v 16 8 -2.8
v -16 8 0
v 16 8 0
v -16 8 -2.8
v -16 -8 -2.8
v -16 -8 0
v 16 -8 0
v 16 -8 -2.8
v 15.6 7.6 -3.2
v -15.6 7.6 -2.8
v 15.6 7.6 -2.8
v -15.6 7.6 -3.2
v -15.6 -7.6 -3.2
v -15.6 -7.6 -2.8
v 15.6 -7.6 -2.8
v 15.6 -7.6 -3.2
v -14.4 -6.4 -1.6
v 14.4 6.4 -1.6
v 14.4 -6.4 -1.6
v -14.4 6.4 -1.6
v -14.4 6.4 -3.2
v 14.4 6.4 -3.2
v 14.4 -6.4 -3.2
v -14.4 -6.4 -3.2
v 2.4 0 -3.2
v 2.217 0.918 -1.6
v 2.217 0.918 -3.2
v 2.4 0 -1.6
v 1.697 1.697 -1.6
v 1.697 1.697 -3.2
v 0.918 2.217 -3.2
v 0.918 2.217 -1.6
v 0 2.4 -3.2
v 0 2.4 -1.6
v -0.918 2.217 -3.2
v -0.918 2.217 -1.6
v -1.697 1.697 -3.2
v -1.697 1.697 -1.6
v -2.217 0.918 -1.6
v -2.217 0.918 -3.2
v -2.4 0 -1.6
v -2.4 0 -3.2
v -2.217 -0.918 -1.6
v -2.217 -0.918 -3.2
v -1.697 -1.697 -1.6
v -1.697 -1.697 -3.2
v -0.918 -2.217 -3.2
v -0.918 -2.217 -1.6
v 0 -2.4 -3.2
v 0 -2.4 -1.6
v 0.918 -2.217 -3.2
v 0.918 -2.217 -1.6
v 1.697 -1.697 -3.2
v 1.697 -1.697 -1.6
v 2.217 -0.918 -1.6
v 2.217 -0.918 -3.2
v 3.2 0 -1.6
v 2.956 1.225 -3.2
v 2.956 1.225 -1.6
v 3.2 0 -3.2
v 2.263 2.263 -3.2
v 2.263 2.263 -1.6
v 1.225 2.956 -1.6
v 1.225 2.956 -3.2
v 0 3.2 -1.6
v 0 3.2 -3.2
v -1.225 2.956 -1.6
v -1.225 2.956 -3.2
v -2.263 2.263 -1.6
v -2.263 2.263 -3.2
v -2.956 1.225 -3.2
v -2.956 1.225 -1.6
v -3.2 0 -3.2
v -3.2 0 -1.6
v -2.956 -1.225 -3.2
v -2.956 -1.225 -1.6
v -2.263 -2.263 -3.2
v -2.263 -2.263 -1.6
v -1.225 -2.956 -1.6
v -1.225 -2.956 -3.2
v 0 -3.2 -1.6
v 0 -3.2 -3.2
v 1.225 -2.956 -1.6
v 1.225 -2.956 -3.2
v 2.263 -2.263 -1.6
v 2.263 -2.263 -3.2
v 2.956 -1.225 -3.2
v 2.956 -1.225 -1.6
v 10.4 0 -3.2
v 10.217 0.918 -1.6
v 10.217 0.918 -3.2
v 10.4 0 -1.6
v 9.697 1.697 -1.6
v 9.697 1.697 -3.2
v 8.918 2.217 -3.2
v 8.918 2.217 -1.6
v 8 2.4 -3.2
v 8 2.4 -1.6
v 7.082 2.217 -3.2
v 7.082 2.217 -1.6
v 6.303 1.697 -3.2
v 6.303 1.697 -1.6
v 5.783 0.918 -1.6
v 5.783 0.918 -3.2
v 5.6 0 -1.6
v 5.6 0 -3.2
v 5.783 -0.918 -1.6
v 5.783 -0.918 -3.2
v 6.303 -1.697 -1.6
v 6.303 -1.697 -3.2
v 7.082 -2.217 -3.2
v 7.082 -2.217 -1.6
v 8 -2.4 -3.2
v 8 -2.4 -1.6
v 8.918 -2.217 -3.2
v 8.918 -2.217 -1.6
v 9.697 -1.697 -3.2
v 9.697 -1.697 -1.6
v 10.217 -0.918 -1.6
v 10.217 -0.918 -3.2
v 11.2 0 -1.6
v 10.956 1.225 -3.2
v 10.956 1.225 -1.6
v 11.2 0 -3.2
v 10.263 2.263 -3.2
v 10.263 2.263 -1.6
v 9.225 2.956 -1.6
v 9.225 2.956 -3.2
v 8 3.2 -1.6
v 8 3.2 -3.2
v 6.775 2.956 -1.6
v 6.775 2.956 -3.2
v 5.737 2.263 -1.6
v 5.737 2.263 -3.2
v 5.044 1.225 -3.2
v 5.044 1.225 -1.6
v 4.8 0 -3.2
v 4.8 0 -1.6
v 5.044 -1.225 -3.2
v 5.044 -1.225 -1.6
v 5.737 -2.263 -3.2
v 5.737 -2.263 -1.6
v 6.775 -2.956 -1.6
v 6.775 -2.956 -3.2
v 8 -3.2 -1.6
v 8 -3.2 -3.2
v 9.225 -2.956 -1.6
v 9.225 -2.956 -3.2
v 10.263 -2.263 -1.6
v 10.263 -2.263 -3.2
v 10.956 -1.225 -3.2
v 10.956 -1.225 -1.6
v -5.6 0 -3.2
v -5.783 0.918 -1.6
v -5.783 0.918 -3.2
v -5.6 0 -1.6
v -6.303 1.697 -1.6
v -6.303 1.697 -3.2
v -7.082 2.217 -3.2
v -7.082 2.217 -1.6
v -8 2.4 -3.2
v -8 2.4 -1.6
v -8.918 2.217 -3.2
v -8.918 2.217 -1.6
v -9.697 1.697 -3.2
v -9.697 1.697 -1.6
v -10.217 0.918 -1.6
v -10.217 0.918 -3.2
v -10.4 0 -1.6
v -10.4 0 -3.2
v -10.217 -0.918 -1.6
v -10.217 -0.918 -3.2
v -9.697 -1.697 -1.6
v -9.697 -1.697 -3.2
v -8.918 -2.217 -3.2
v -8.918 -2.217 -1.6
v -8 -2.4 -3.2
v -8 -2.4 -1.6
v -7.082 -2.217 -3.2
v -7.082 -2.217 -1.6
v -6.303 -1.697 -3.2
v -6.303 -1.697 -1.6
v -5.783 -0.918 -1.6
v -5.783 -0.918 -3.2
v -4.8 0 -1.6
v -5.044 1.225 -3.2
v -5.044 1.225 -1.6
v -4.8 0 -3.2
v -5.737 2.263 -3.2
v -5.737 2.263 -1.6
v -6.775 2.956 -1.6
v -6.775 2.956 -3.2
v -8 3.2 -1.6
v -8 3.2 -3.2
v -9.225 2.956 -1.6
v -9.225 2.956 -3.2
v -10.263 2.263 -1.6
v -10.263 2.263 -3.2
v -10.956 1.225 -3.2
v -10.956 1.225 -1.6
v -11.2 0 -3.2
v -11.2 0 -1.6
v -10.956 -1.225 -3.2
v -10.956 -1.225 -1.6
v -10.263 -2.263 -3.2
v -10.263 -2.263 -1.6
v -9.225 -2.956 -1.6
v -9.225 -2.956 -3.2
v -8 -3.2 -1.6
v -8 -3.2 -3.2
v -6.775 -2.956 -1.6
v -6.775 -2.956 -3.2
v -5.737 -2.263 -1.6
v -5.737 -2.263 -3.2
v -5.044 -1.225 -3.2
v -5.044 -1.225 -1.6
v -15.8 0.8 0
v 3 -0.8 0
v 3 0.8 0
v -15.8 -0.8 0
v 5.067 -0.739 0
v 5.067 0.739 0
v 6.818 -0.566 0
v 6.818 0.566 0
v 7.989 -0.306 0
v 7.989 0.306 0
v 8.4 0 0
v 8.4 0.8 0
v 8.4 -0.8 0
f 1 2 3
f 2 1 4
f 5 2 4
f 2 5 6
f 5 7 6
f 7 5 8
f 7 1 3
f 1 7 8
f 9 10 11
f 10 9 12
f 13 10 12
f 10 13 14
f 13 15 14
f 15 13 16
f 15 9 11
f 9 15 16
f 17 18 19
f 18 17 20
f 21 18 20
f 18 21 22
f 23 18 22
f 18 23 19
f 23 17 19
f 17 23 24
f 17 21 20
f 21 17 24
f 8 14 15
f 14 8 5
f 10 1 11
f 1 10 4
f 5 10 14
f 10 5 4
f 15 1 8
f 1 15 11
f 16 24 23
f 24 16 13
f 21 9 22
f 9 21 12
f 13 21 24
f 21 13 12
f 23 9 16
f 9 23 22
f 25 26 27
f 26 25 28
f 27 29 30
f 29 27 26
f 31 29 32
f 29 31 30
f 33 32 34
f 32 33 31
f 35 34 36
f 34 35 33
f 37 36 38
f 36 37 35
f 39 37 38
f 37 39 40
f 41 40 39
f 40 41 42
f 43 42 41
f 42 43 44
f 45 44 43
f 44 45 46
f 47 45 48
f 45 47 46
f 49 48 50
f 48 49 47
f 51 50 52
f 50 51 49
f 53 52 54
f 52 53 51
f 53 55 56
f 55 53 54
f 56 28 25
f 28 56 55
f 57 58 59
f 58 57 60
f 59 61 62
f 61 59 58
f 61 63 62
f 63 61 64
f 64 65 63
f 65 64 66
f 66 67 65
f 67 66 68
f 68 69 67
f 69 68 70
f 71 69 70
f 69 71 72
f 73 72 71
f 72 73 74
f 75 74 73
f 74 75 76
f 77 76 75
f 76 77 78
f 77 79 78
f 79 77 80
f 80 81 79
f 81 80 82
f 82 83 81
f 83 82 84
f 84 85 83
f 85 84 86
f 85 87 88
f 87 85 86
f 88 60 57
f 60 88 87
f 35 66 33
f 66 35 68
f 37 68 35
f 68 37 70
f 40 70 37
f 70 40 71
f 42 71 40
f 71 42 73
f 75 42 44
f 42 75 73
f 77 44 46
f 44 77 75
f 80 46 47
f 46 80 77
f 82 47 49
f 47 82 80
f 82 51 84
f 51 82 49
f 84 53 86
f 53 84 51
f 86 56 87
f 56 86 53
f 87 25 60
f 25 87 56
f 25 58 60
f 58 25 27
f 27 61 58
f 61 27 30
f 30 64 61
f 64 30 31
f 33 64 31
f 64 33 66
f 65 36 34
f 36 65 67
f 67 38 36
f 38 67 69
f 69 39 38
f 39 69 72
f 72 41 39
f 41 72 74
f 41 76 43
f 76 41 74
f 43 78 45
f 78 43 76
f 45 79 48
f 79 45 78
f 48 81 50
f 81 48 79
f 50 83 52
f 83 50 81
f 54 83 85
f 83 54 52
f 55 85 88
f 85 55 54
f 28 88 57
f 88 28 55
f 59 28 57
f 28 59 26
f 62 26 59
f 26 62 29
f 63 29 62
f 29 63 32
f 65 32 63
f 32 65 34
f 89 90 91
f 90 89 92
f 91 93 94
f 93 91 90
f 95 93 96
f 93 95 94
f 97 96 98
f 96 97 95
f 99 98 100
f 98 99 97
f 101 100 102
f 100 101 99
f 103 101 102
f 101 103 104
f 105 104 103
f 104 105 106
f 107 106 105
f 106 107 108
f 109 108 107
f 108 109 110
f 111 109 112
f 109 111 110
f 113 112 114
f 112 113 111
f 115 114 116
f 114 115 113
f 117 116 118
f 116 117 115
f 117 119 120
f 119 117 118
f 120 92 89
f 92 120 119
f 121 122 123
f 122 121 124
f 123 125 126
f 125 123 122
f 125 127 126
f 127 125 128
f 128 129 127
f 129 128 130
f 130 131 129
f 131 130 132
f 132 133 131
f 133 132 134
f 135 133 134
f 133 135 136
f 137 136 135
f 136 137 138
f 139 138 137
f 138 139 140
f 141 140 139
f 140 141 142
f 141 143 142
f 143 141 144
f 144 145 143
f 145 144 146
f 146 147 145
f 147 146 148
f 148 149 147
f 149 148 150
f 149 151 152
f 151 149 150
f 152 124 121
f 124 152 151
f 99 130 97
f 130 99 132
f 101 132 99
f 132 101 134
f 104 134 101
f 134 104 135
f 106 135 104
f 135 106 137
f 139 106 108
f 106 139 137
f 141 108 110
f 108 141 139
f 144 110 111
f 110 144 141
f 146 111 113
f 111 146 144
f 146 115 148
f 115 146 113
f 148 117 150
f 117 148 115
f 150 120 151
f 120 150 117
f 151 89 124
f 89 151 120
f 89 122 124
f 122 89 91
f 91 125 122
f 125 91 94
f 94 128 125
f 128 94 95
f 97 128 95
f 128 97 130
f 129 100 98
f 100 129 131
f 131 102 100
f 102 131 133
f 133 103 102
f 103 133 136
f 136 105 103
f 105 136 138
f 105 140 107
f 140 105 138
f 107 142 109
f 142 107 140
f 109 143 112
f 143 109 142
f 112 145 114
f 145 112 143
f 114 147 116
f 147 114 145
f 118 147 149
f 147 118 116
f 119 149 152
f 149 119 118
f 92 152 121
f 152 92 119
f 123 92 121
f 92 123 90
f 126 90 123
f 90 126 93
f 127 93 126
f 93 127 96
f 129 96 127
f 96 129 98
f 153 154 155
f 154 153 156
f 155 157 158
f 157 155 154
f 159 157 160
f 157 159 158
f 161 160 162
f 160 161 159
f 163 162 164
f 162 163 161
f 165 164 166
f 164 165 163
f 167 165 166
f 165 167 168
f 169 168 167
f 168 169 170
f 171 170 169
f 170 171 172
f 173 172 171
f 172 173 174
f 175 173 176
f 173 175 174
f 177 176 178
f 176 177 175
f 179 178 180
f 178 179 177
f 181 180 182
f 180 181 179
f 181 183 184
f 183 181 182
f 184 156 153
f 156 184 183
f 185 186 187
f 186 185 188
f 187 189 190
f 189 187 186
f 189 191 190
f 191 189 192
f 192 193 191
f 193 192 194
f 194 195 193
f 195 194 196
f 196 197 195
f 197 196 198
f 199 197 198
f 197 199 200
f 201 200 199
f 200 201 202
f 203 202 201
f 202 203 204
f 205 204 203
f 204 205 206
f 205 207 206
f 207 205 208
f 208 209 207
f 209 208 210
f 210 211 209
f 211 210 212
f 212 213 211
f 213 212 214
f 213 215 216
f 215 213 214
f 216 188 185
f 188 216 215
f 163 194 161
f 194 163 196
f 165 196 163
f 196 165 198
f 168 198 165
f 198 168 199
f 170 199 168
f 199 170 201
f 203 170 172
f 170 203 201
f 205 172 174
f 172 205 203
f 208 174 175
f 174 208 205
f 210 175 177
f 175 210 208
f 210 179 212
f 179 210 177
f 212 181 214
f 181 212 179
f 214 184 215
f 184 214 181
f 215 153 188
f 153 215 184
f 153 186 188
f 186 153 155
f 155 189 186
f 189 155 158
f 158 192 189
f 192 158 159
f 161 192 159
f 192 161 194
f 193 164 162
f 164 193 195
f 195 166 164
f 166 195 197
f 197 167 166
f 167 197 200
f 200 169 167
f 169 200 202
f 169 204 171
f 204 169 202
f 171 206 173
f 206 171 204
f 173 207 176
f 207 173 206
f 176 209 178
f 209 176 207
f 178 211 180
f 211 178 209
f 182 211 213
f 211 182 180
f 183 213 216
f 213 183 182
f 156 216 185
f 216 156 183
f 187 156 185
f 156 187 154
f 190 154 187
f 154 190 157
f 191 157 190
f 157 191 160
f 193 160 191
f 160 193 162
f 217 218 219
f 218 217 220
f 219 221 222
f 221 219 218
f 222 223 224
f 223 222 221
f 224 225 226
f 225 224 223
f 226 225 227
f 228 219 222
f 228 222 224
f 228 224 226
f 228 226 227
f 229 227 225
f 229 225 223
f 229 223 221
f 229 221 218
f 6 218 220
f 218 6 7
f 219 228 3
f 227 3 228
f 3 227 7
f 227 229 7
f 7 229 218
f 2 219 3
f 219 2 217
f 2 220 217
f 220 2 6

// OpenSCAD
// file: ../p/4-4ring3.scad
use <../lib.scad>
$fa=1; $fs=0.2;
function ldraw_lib__4_4ring3(realsolid=false) = [
// 0 Ring  3 x 1.0
// 0 Name: 4-4ring3.dat
// 0 Author: James Jessiman
// 0 !LDRAW_ORG Primitive UPDATE 2009-01
// 0 !LICENSE Licensed under CC BY 2.0 and CC BY 4.0 : see CAreadme.txt
// 
// 0 BFC CERTIFY CCW
  [0,"BFC","CERTIFY"],
  [0,"BFC","CCW"],
// 
// 0 !HISTORY 1998-12-15 [PTadmin] Official Update 1998-10
// 0 !HISTORY 2002-04-05 [hafhead] Added BFC statement
// 0 !HISTORY 2002-04-25 [PTadmin] Official Update 2002-02
// 0 !HISTORY 2007-06-24 [PTadmin] Header formatted for Contributor Agreement
// 0 !HISTORY 2008-07-01 [PTadmin] Official Update 2008-01
// 0 !HISTORY 2008-08-26 [cwdee] Switch polygon winding and rename
// 0 !HISTORY 2009-05-02 [PTadmin] Official Update 2009-01
// 
// 
// 4 16 -1.5308 0 3.6956 -1.1481 0 2.7717 0 0 3 0 0 4
  [4,16,-1.5308,0,3.6956,-1.1481,0,2.7717,0,0,3,0,0,4],
// 4 16 -2.8284 0 2.8284 -2.1213 0 2.1213 -1.1481 0 2.7717 -1.5308 0 3.6956
  [4,16,-2.8284,0,2.8284,-2.1213,0,2.1213,-1.1481,0,2.7717,-1.5308,0,3.6956],
// 4 16 -3.6956 0 1.5308 -2.7717 0 1.1481 -2.1213 0 2.1213 -2.8284 0 2.8284
  [4,16,-3.6956,0,1.5308,-2.7717,0,1.1481,-2.1213,0,2.1213,-2.8284,0,2.8284],
// 4 16 -4 0 0 -3 0 0 -2.7717 0 1.1481 -3.6956 0 1.5308
  [4,16,-4,0,0,-3,0,0,-2.7717,0,1.1481,-3.6956,0,1.5308],
// 4 16 -3.6956 0 -1.5308 -2.7717 0 -1.1481 -3 0 0 -4 0 0
  [4,16,-3.6956,0,-1.5308,-2.7717,0,-1.1481,-3,0,0,-4,0,0],
// 4 16 -2.8284 0 -2.8284 -2.1213 0 -2.1213 -2.7717 0 -1.1481 -3.6956 0 -1.5308
  [4,16,-2.8284,0,-2.8284,-2.1213,0,-2.1213,-2.7717,0,-1.1481,-3.6956,0,-1.5308],
// 4 16 -1.5308 0 -3.6956 -1.1481 0 -2.7717 -2.1213 0 -2.1213 -2.8284 0 -2.8284
  [4,16,-1.5308,0,-3.6956,-1.1481,0,-2.7717,-2.1213,0,-2.1213,-2.8284,0,-2.8284],
// 4 16 0 0 -4 0 0 -3 -1.1481 0 -2.7717 -1.5308 0 -3.6956
  [4,16,0,0,-4,0,0,-3,-1.1481,0,-2.7717,-1.5308,0,-3.6956],
// 4 16 1.5308 0 -3.6956 1.1481 0 -2.7717 0 0 -3 0 0 -4
  [4,16,1.5308,0,-3.6956,1.1481,0,-2.7717,0,0,-3,0,0,-4],
// 4 16 2.8284 0 -2.8284 2.1213 0 -2.1213 1.1481 0 -2.7717 1.5308 0 -3.6956
  [4,16,2.8284,0,-2.8284,2.1213,0,-2.1213,1.1481,0,-2.7717,1.5308,0,-3.6956],
// 4 16 3.6956 0 -1.5308 2.7717 0 -1.1481 2.1213 0 -2.1213 2.8284 0 -2.8284
  [4,16,3.6956,0,-1.5308,2.7717,0,-1.1481,2.1213,0,-2.1213,2.8284,0,-2.8284],
// 4 16 4 0 0 3 0 0 2.7717 0 -1.1481 3.6956 0 -1.5308
  [4,16,4,0,0,3,0,0,2.7717,0,-1.1481,3.6956,0,-1.5308],
// 4 16 3.6956 0 1.5308 2.7717 0 1.1481 3 0 0 4 0 0
  [4,16,3.6956,0,1.5308,2.7717,0,1.1481,3,0,0,4,0,0],
// 4 16 2.8284 0 2.8284 2.1213 0 2.1213 2.7717 0 1.1481 3.6956 0 1.5308
  [4,16,2.8284,0,2.8284,2.1213,0,2.1213,2.7717,0,1.1481,3.6956,0,1.5308],
// 4 16 1.5308 0 3.6956 1.1481 0 2.7717 2.1213 0 2.1213 2.8284 0 2.8284
  [4,16,1.5308,0,3.6956,1.1481,0,2.7717,2.1213,0,2.1213,2.8284,0,2.8284],
// 4 16 0 0 4 0 0 3 1.1481 0 2.7717 1.5308 0 3.6956
  [4,16,0,0,4,0,0,3,1.1481,0,2.7717,1.5308,0,3.6956],
// 0
];
module ldraw_lib__4_4ring3(step=0, col=false, unit=2/5, alt=false, line=0.2, solid=!$preview)
    makepoly(ldraw_lib__4_4ring3(solid), step=step, col=col, unit=unit, alt=alt, line=line, solid=solid);
ldraw_lib__4_4ring3(line=0.2);
// file: ../p/4-4edge.scad
use <../lib.scad>
function ldraw_lib__4_4edge() = [
// 0 Circle 1.0
// 0 Name: 4-4edge.dat
// 0 Author: James Jessiman
// 0 !LDRAW_ORG Primitive UPDATE 2017-01
// 0 !LICENSE Licensed under CC BY 2.0 and CC BY 4.0 : see CAreadme.txt
// 
// 0 BFC CERTIFY CCW
  [0,"BFC","CERTIFY"],
  [0,"BFC","CCW"],
// 
// 0 !HISTORY 1998-12-15 [PTadmin] Official Update 1998-10
// 0 !HISTORY 2005-12-28 [PTadmin] Official Update 2005-01
// 0 !HISTORY 2007-06-24 [PTadmin] Header formatted for Contributor Agreement
// 0 !HISTORY 2008-07-01 [PTadmin] Official Update 2008-01
// 0 !HISTORY 2017-01-15 [Steffen] BFCed
// 0 !HISTORY 2017-12-30 [PTadmin] Official Update 2017-01
// 
// 
// 2 24 1 0 0 0.9239 0 0.3827
  [2,24,1,0,0,0.9239,0,0.3827],
// 2 24 0.9239 0 0.3827 0.7071 0 0.7071
  [2,24,0.9239,0,0.3827,0.7071,0,0.7071],
// 2 24 0.7071 0 0.7071 0.3827 0 0.9239
  [2,24,0.7071,0,0.7071,0.3827,0,0.9239],
// 2 24 0.3827 0 0.9239 0 0 1
  [2,24,0.3827,0,0.9239,0,0,1],
// 2 24 0 0 1 -0.3827 0 0.9239
  [2,24,0,0,1,-0.3827,0,0.9239],
// 2 24 -0.3827 0 0.9239 -0.7071 0 0.7071
  [2,24,-0.3827,0,0.9239,-0.7071,0,0.7071],
// 2 24 -0.7071 0 0.7071 -0.9239 0 0.3827
  [2,24,-0.7071,0,0.7071,-0.9239,0,0.3827],
// 2 24 -0.9239 0 0.3827 -1 0 -0
  [2,24,-0.9239,0,0.3827,-1,0,-0],
// 2 24 -1 0 -0 -0.9239 0 -0.3827
  [2,24,-1,0,-0,-0.9239,0,-0.3827],
// 2 24 -0.9239 0 -0.3827 -0.7071 0 -0.7071
  [2,24,-0.9239,0,-0.3827,-0.7071,0,-0.7071],
// 2 24 -0.7071 0 -0.7071 -0.3827 0 -0.9239
  [2,24,-0.7071,0,-0.7071,-0.3827,0,-0.9239],
// 2 24 -0.3827 0 -0.9239 0 0 -1
  [2,24,-0.3827,0,-0.9239,0,0,-1],
// 2 24 0 0 -1 0.3827 0 -0.9239
  [2,24,0,0,-1,0.3827,0,-0.9239],
// 2 24 0.3827 0 -0.9239 0.7071 0 -0.7071
  [2,24,0.3827,0,-0.9239,0.7071,0,-0.7071],
// 2 24 0.7071 0 -0.7071 0.9239 0 -0.3827
  [2,24,0.7071,0,-0.7071,0.9239,0,-0.3827],
// 2 24 0.9239 0 -0.3827 1 0 0
  [2,24,0.9239,0,-0.3827,1,0,0],
];
module ldraw_lib__4_4edge(step=0, col=false, unit=2/5, alt=false, line=0.2, solid=!$preview)
    makepoly(ldraw_lib__4_4edge(), step=step, col=col, unit=unit, alt=alt, line=line, solid=solid);
ldraw_lib__4_4edge(line=0.2);
// file: ../p/4-4cyli.scad
use <../lib.scad>
$fa=1; $fs=0.2;
function ldraw_lib__4_4cyli(realsolid=false) = [
// 0 Cylinder 1.0
// 0 Name: 4-4cyli.dat
// 0 Author: James Jessiman
// 0 !LDRAW_ORG Primitive UPDATE 2005-01
// 0 !LICENSE Licensed under CC BY 2.0 and CC BY 4.0 : see CAreadme.txt
// 
// 0 BFC CERTIFY CCW
  [0,"BFC","CERTIFY"],
  [0,"BFC","CCW"],
// 
// 0 !HISTORY 1998-12-15 [PTadmin] Official Update 1998-10
// 0 !HISTORY 2002-03-23 [sbliss] Added BFC statement; merged headers from files in distributions LDraw 0.27 and Complete.
// 0 !HISTORY 2002-04-25 [PTadmin] Official Update 2002-02
// 0 !HISTORY 2004-12-14 [guyvivan] BFC CCW
// 0 !HISTORY 2005-12-28 [PTadmin] Official Update 2005-01
// 0 !HISTORY 2007-06-24 [PTadmin] Header formatted for Contributor Agreement
// 0 !HISTORY 2008-07-01 [PTadmin] Official Update 2008-01
// 
// 
// 4 16 1 1 0 0.9239 1 0.3827 0.9239 0 0.3827 1 0 0
  [4,16,1,1,0,0.9239,1,0.3827,0.9239,0,0.3827,1,0,0],
// 5 24 1 0 0 1 1 0 0.9239 0 0.3827 0.9239 0 -0.3827
  [5,24,1,0,0,1,1,0,0.9239,0,0.3827,0.9239,0,-0.3827],
// 4 16 0.9239 1 0.3827 0.7071 1 0.7071 0.7071 0 0.7071 0.9239 0 0.3827
  [4,16,0.9239,1,0.3827,0.7071,1,0.7071,0.7071,0,0.7071,0.9239,0,0.3827],
// 5 24 0.9239 0 0.3827 0.9239 1 0.3827 0.7071 0 0.7071 1 0 0
  [5,24,0.9239,0,0.3827,0.9239,1,0.3827,0.7071,0,0.7071,1,0,0],
// 4 16 0.7071 1 0.7071 0.3827 1 0.9239 0.3827 0 0.9239 0.7071 0 0.7071
  [4,16,0.7071,1,0.7071,0.3827,1,0.9239,0.3827,0,0.9239,0.7071,0,0.7071],
// 5 24 0.7071 0 0.7071 0.7071 1 0.7071 0.3827 0 0.9239 0.9239 0 0.3827
  [5,24,0.7071,0,0.7071,0.7071,1,0.7071,0.3827,0,0.9239,0.9239,0,0.3827],
// 4 16 0.3827 1 0.9239 0 1 1 0 0 1 0.3827 0 0.9239
  [4,16,0.3827,1,0.9239,0,1,1,0,0,1,0.3827,0,0.9239],
// 5 24 0.3827 0 0.9239 0.3827 1 0.9239 0 0 1 0.7071 0 0.7071
  [5,24,0.3827,0,0.9239,0.3827,1,0.9239,0,0,1,0.7071,0,0.7071],
// 4 16 0 1 1 -0.3827 1 0.9239 -0.3827 0 0.9239 0 0 1
  [4,16,0,1,1,-0.3827,1,0.9239,-0.3827,0,0.9239,0,0,1],
// 5 24 0 0 1 0 1 1 -0.3827 0 0.9239 0.3827 0 0.9239
  [5,24,0,0,1,0,1,1,-0.3827,0,0.9239,0.3827,0,0.9239],
// 4 16 -0.3827 1 0.9239 -0.7071 1 0.7071 -0.7071 0 0.7071 -0.3827 0 0.9239
  [4,16,-0.3827,1,0.9239,-0.7071,1,0.7071,-0.7071,0,0.7071,-0.3827,0,0.9239],
// 5 24 -0.3827 0 0.9239 -0.3827 1 0.9239 -0.7071 0 0.7071 0 0 1
  [5,24,-0.3827,0,0.9239,-0.3827,1,0.9239,-0.7071,0,0.7071,0,0,1],
// 4 16 -0.7071 1 0.7071 -0.9239 1 0.3827 -0.9239 0 0.3827 -0.7071 0 0.7071
  [4,16,-0.7071,1,0.7071,-0.9239,1,0.3827,-0.9239,0,0.3827,-0.7071,0,0.7071],
// 5 24 -0.7071 0 0.7071 -0.7071 1 0.7071 -0.9239 0 0.3827 -0.3827 0 0.9239
  [5,24,-0.7071,0,0.7071,-0.7071,1,0.7071,-0.9239,0,0.3827,-0.3827,0,0.9239],
// 4 16 -0.9239 1 0.3827 -1 1 0 -1 0 0 -0.9239 0 0.3827
  [4,16,-0.9239,1,0.3827,-1,1,0,-1,0,0,-0.9239,0,0.3827],
// 5 24 -0.9239 0 0.3827 -0.9239 1 0.3827 -1 0 0 -0.7071 0 0.7071
  [5,24,-0.9239,0,0.3827,-0.9239,1,0.3827,-1,0,0,-0.7071,0,0.7071],
// 4 16 -1 1 0 -0.9239 1 -0.3827 -0.9239 0 -0.3827 -1 0 0
  [4,16,-1,1,0,-0.9239,1,-0.3827,-0.9239,0,-0.3827,-1,0,0],
// 5 24 -1 0 0 -1 1 0 -0.9239 0 -0.3827 -0.9239 0 0.3827
  [5,24,-1,0,0,-1,1,0,-0.9239,0,-0.3827,-0.9239,0,0.3827],
// 4 16 -0.9239 1 -0.3827 -0.7071 1 -0.7071 -0.7071 0 -0.7071 -0.9239 0 -0.3827
  [4,16,-0.9239,1,-0.3827,-0.7071,1,-0.7071,-0.7071,0,-0.7071,-0.9239,0,-0.3827],
// 5 24 -0.9239 0 -0.3827 -0.9239 1 -0.3827 -0.7071 0 -0.7071 -1 0 0
  [5,24,-0.9239,0,-0.3827,-0.9239,1,-0.3827,-0.7071,0,-0.7071,-1,0,0],
// 4 16 -0.7071 1 -0.7071 -0.3827 1 -0.9239 -0.3827 0 -0.9239 -0.7071 0 -0.7071
  [4,16,-0.7071,1,-0.7071,-0.3827,1,-0.9239,-0.3827,0,-0.9239,-0.7071,0,-0.7071],
// 5 24 -0.7071 0 -0.7071 -0.7071 1 -0.7071 -0.3827 0 -0.9239 -0.9239 0 -0.3827
  [5,24,-0.7071,0,-0.7071,-0.7071,1,-0.7071,-0.3827,0,-0.9239,-0.9239,0,-0.3827],
// 4 16 -0.3827 1 -0.9239 0 1 -1 0 0 -1 -0.3827 0 -0.9239
  [4,16,-0.3827,1,-0.9239,0,1,-1,0,0,-1,-0.3827,0,-0.9239],
// 5 24 -0.3827 0 -0.9239 -0.3827 1 -0.9239 0 0 -1 -0.7071 0 -0.7071
  [5,24,-0.3827,0,-0.9239,-0.3827,1,-0.9239,0,0,-1,-0.7071,0,-0.7071],
// 4 16 0 1 -1 0.3827 1 -0.9239 0.3827 0 -0.9239 0 0 -1
  [4,16,0,1,-1,0.3827,1,-0.9239,0.3827,0,-0.9239,0,0,-1],
// 5 24 0 0 -1 0 1 -1 0.3827 0 -0.9239 -0.3827 0 -0.9239
  [5,24,0,0,-1,0,1,-1,0.3827,0,-0.9239,-0.3827,0,-0.9239],
// 4 16 0.3827 1 -0.9239 0.7071 1 -0.7071 0.7071 0 -0.7071 0.3827 0 -0.9239
  [4,16,0.3827,1,-0.9239,0.7071,1,-0.7071,0.7071,0,-0.7071,0.3827,0,-0.9239],
// 5 24 0.3827 0 -0.9239 0.3827 1 -0.9239 0.7071 0 -0.7071 0 0 -1
  [5,24,0.3827,0,-0.9239,0.3827,1,-0.9239,0.7071,0,-0.7071,0,0,-1],
// 4 16 0.7071 1 -0.7071 0.9239 1 -0.3827 0.9239 0 -0.3827 0.7071 0 -0.7071
  [4,16,0.7071,1,-0.7071,0.9239,1,-0.3827,0.9239,0,-0.3827,0.7071,0,-0.7071],
// 5 24 0.7071 0 -0.7071 0.7071 1 -0.7071 0.9239 0 -0.3827 0.3827 0 -0.9239
  [5,24,0.7071,0,-0.7071,0.7071,1,-0.7071,0.9239,0,-0.3827,0.3827,0,-0.9239],
// 4 16 0.9239 1 -0.3827 1 1 0 1 0 0 0.9239 0 -0.3827
  [4,16,0.9239,1,-0.3827,1,1,0,1,0,0,0.9239,0,-0.3827],
// 5 24 0.9239 0 -0.3827 0.9239 1 -0.3827 1 0 0 0.7071 0 -0.7071
  [5,24,0.9239,0,-0.3827,0.9239,1,-0.3827,1,0,0,0.7071,0,-0.7071],
// 0
];
module ldraw_lib__4_4cyli(step=0, col=false, unit=2/5, alt=false, line=0.2, solid=!$preview)
    makepoly(ldraw_lib__4_4cyli(solid), step=step, col=col, unit=unit, alt=alt, line=line, solid=solid);
ldraw_lib__4_4cyli(line=0.2);
// file: ../p/stud4.scad
use <../lib.scad>
use <4-4cyli.scad>
use <4-4edge.scad>
use <4-4ring3.scad>
function ldraw_lib__stud4() = [
// 0 Stud Tube Open
// 0 Name: stud4.dat
// 0 Author: James Jessiman
// 0 !LDRAW_ORG Primitive UPDATE 2009-02
// 0 !LICENSE Licensed under CC BY 4.0 : see CAreadme.txt
// 
// 0 BFC CERTIFY CCW
  [0,"BFC","CERTIFY"],
  [0,"BFC","CCW"],
// 
// 0 !HISTORY 1999-07-05 [PTadmin] Official Update 1999-05
// 0 !HISTORY 2002-04-04 [sbliss] Modified for BFC compliance
// 0 !HISTORY 2002-04-25 [PTadmin] Official Update 2002-02
// 0 !HISTORY 2007-06-24 [PTadmin] Header formatted for Contributor Agreement
// 0 !HISTORY 2008-07-01 [PTadmin] Official Update 2008-01
// 0 !HISTORY 2009-06-21 [cwdee] Update ring references to 4-4ring
// 0 !HISTORY 2009-09-03 [PTadmin] Official Update 2009-02
// 
// 
// 1 16 0 -4 0 6 0 0 0 1 0 0 0 6 4-4edge.dat
  [1,16,0,-4,0,6,0,0,0,1,0,0,0,6, ldraw_lib__4_4edge()],
// 1 16 0 -4 0 8 0 0 0 1 0 0 0 8 4-4edge.dat
  [1,16,0,-4,0,8,0,0,0,1,0,0,0,8, ldraw_lib__4_4edge()],
// 1 16 0 0 0 6 0 0 0 1 0 0 0 6 4-4edge.dat
  [1,16,0,0,0,6,0,0,0,1,0,0,0,6, ldraw_lib__4_4edge()],
// 1 16 0 0 0 8 0 0 0 1 0 0 0 8 4-4edge.dat
  [1,16,0,0,0,8,0,0,0,1,0,0,0,8, ldraw_lib__4_4edge()],
// 0 BFC INVERTNEXT
  [0,"BFC","INVERTNEXT"],
// 1 16 0 -4 0 6 0 0 0 4 0 0 0 6 4-4cyli.dat
  [1,16,0,-4,0,6,0,0,0,4,0,0,0,6, ldraw_lib__4_4cyli()],
// 1 16 0 -4 0 8 0 0 0 4 0 0 0 8 4-4cyli.dat
  [1,16,0,-4,0,8,0,0,0,4,0,0,0,8, ldraw_lib__4_4cyli()],
// 1 16 0 -4 0 2 0 0 0 1 0 0 0 2 4-4ring3.dat
  [1,16,0,-4,0,2,0,0,0,1,0,0,0,2, ldraw_lib__4_4ring3()],
  [-1,16,0,0,0,2,0,0,0,-1,0,0,0,2, ldraw_lib__4_4ring3()],
// 0
];
module ldraw_lib__stud4(step=0, col=false, unit=2/5, alt=false, line=0.2, solid=!$preview)
    makepoly(ldraw_lib__stud4(), step=step, col=col, unit=unit, alt=alt, line=line, solid=solid);
ldraw_lib__stud4(line=0.2);
// file: ../p/box5.scad
use <../lib.scad>
function ldraw_lib__box5() = [
// 0 Box with 5 Faces and All Edges
// 0 Name: box5.dat
// 0 Author: James Jessiman
// 0 !LDRAW_ORG Primitive UPDATE 2012-01
// 0 !LICENSE Licensed under CC BY 2.0 and CC BY 4.0 : see CAreadme.txt
// 
// 0 BFC CERTIFY CCW
  [0,"BFC","CERTIFY"],
  [0,"BFC","CCW"],
// 
// 0 !HISTORY 2002-04-03 [sbliss] Modified for BFC compliance
// 0 !HISTORY 2002-04-25 [PTadmin] Official Update 2002-02
// 0 !HISTORY 2007-06-24 [PTadmin] Header formatted for Contributor Agreement
// 0 !HISTORY 2008-07-01 [PTadmin] Official Update 2008-01
// 0 !HISTORY 2012-02-16 [Philo] Changed to CCW
// 0 !HISTORY 2012-03-30 [PTadmin] Official Update 2012-01
// 
// 
// 2 24 1 1 1 -1 1 1
  [2,24,1,1,1,-1,1,1],
// 2 24 -1 1 1 -1 1 -1
  [2,24,-1,1,1,-1,1,-1],
// 2 24 -1 1 -1 1 1 -1
  [2,24,-1,1,-1,1,1,-1],
// 2 24 1 1 -1 1 1 1
  [2,24,1,1,-1,1,1,1],
// 2 24 1 0 1 -1 0 1
  [2,24,1,0,1,-1,0,1],
// 2 24 -1 0 1 -1 0 -1
  [2,24,-1,0,1,-1,0,-1],
// 2 24 -1 0 -1 1 0 -1
  [2,24,-1,0,-1,1,0,-1],
// 2 24 1 0 -1 1 0 1
  [2,24,1,0,-1,1,0,1],
// 2 24 1 0 1 1 1 1
  [2,24,1,0,1,1,1,1],
// 2 24 -1 0 1 -1 1 1
  [2,24,-1,0,1,-1,1,1],
// 2 24 1 0 -1 1 1 -1
  [2,24,1,0,-1,1,1,-1],
// 2 24 -1 0 -1 -1 1 -1
  [2,24,-1,0,-1,-1,1,-1],
// 4 16 -1 1 1 1 1 1 1 1 -1 -1 1 -1
  [4,16,-1,1,1,1,1,1,1,1,-1,-1,1,-1],
// 4 16 -1 1 1 -1 0 1 1 0 1 1 1 1
  [4,16,-1,1,1,-1,0,1,1,0,1,1,1,1],
// 4 16 -1 1 -1 -1 0 -1 -1 0 1 -1 1 1
  [4,16,-1,1,-1,-1,0,-1,-1,0,1,-1,1,1],
// 4 16 1 1 -1 1 0 -1 -1 0 -1 -1 1 -1
  [4,16,1,1,-1,1,0,-1,-1,0,-1,-1,1,-1],
// 4 16 1 1 1 1 0 1 1 0 -1 1 1 -1
  [4,16,1,1,1,1,0,1,1,0,-1,1,1,-1],
];
makepoly(ldraw_lib__box5(), line=0.2);
// file: ../p/box4.scad
use <../lib.scad>
function ldraw_lib__box4() = [
// 0 Box with 4 Faces (2 Parallel Pairs) and All Edges
// 0 Name: box4.dat
// 0 Author: James Jessiman
// 0 !LDRAW_ORG Primitive UPDATE 2012-01
// 0 !LICENSE Licensed under CC BY 4.0 : see CAreadme.txt
// 
// 0 BFC CERTIFY CCW
  [0,"BFC","CERTIFY"],
  [0,"BFC","CCW"],
// 
// 0 !HISTORY 2002-04-03 [sbliss] Modified for BFC compliance
// 0 !HISTORY 2002-04-25 [PTadmin] Official Update 2002-02
// 0 !HISTORY 2007-06-24 [PTadmin] Header formatted for Contributor Agreement
// 0 !HISTORY 2008-07-01 [PTadmin] Official Update 2008-01
// 0 !HISTORY 2012-02-16 [Philo] Changed to CCW
// 0 !HISTORY 2012-03-30 [PTadmin] Official Update 2012-01
// 
// 
// 2 24 1 1 1 -1 1 1
  [2,24,1,1,1,-1,1,1],
// 2 24 -1 1 1 -1 1 -1
  [2,24,-1,1,1,-1,1,-1],
// 2 24 -1 1 -1 1 1 -1
  [2,24,-1,1,-1,1,1,-1],
// 2 24 1 1 -1 1 1 1
  [2,24,1,1,-1,1,1,1],
// 2 24 1 0 1 -1 0 1
  [2,24,1,0,1,-1,0,1],
// 2 24 -1 0 1 -1 0 -1
  [2,24,-1,0,1,-1,0,-1],
// 2 24 -1 0 -1 1 0 -1
  [2,24,-1,0,-1,1,0,-1],
// 2 24 1 0 -1 1 0 1
  [2,24,1,0,-1,1,0,1],
// 2 24 1 0 1 1 1 1
  [2,24,1,0,1,1,1,1],
// 2 24 -1 0 1 -1 1 1
  [2,24,-1,0,1,-1,1,1],
// 2 24 1 0 -1 1 1 -1
  [2,24,1,0,-1,1,1,-1],
// 2 24 -1 0 -1 -1 1 -1
  [2,24,-1,0,-1,-1,1,-1],
// 4 16 -1 1 1 -1 0 1 1 0 1 1 1 1
  [4,16,-1,1,1,-1,0,1,1,0,1,1,1,1],
// 4 16 -1 1 -1 -1 0 -1 -1 0 1 -1 1 1
  [4,16,-1,1,-1,-1,0,-1,-1,0,1,-1,1,1],
// 4 16 1 1 -1 1 0 -1 -1 0 -1 -1 1 -1
  [4,16,1,1,-1,1,0,-1,-1,0,-1,-1,1,-1],
// 4 16 1 1 1 1 0 1 1 0 -1 1 1 -1
  [4,16,1,1,1,1,0,1,1,0,-1,1,1,-1],
];
module ldraw_lib__box4(step=0, col=false, unit=2/5, alt=false, line=0.2, solid=!$preview)
    makepoly(ldraw_lib__box4(), step=step, col=col, unit=unit, alt=alt, line=line, solid=solid);
ldraw_lib__box4(line=0.2);
// file: s/87079s01.scad
use <../../lib.scad>
use <../../p/box4.scad>
use <../../p/box5.scad>
use <../../p/stud4.scad>
function ldraw_lib__s__87079s01() = [
// 0 ~Tile  2 x  4 without Top Surface
// 0 Name: s\87079s01.dat
// 0 Author: Philippe Hurbain [Philo]
// 0 !LDRAW_ORG Subpart UPDATE 2025-04
// 0 !LICENSE Licensed under CC BY 4.0 : see CAreadme.txt
// 
// 0 BFC CERTIFY CCW
  [0,"BFC","CERTIFY"],
  [0,"BFC","CCW"],
// 
// 0 !HISTORY 2012-09-30 [Philo] Subparted from Tim Gould's original design
// 0 !HISTORY 2012-12-28 [PTadmin] Official Update 2012-03
// 0 !HISTORY 2025-04-25 [MagFors] Update description
// 0 !HISTORY 2025-04-27 [OrionP] Official Update 2025-04
// 
// 1 16 0 0 0 40 0 0 0 7 0 0 0 20 box4.dat
  [1,16,0,0,0,40,0,0,0,7,0,0,0,20, ldraw_lib__box4()],
// 1 16 0 7 0 39 0 0 0 1 0 0 0 19 box4.dat
  [1,16,0,7,0,39,0,0,0,1,0,0,0,19, ldraw_lib__box4()],
// 0 BFC INVERTNEXT
  [0,"BFC","INVERTNEXT"],
// 1 16 0 8 0 -36 0 0 0 -4 0 0 0 16 box5.dat
  [1,16,0,8,0,-36,0,0,0,-4,0,0,0,16, ldraw_lib__box5()],
// 4 16 -40 7 -20 -39 7 -19 39 7 -19 40 7 -20
  [4,16,-40,7,-20,-39,7,-19,39,7,-19,40,7,-20],
// 4 16 40 7 20 39 7 19 -39 7 19 -40 7 20
  [4,16,40,7,20,39,7,19,-39,7,19,-40,7,20],
// 4 16 -40 7 -20 -40 7 20 -39 7 19 -39 7 -19
  [4,16,-40,7,-20,-40,7,20,-39,7,19,-39,7,-19],
// 4 16 40 7 20 40 7 -20 39 7 -19 39 7 19
  [4,16,40,7,20,40,7,-20,39,7,-19,39,7,19],
// 4 16 -39 8 -19 -36 8 -16 36 8 -16 39 8 -19
  [4,16,-39,8,-19,-36,8,-16,36,8,-16,39,8,-19],
// 4 16 39 8 19 36 8 16 -36 8 16 -39 8 19
  [4,16,39,8,19,36,8,16,-36,8,16,-39,8,19],
// 4 16 -39 8 -19 -39 8 19 -36 8 16 -36 8 -16
  [4,16,-39,8,-19,-39,8,19,-36,8,16,-36,8,-16],
// 4 16 39 8 19 39 8 -19 36 8 -16 36 8 16
  [4,16,39,8,19,39,8,-19,36,8,-16,36,8,16],
// 1 16 0 4 0 1 0 0 0 -1 0 0 0 1 stud4.dat
  [1,16,0,4,0,1,0,0,0,-1,0,0,0,1, ldraw_lib__stud4()],
// 1 16 20 4 0 1 0 0 0 -1 0 0 0 1 stud4.dat
  [1,16,20,4,0,1,0,0,0,-1,0,0,0,1, ldraw_lib__stud4()],
// 1 16 -20 4 0 1 0 0 0 -1 0 0 0 1 stud4.dat
  [1,16,-20,4,0,1,0,0,0,-1,0,0,0,1, ldraw_lib__stud4()],
];
module ldraw_lib__s__87079s01(step=0, col=false, unit=2/5, alt=false, line=0.2, solid=!$preview)
    makepoly(ldraw_lib__s__87079s01(), step=step, col=col, unit=unit, alt=alt, line=line, solid=solid);
ldraw_lib__s__87079s01(line=0.2);
// file: ../p/2-4ndis.scad
use <../lib.scad>
function ldraw_lib__2_4ndis() = [
// 0 Disc Negative 0.5
// 0 Name: 2-4ndis.dat
// 0 Author: James Jessiman
// 0 !LDRAW_ORG Primitive UPDATE 2012-01
// 0 !LICENSE Licensed under CC BY 4.0 : see CAreadme.txt
// 
// 0 BFC CERTIFY CCW
  [0,"BFC","CERTIFY"],
  [0,"BFC","CCW"],
// 
// 0 !HISTORY 2002-03-23 [sbliss] Added BFC statement; compacted code
// 0 !HISTORY 2002-04-25 [PTadmin] Official Update 2002-02
// 0 !HISTORY 2007-06-24 [PTadmin] Header formatted for Contributor Agreement
// 0 !HISTORY 2008-07-01 [PTadmin] Official Update 2008-01
// 0 !HISTORY 2012-02-16 [Philo] Changed to CCW
// 0 !HISTORY 2012-03-30 [PTadmin] Official Update 2012-01
// 
// 
// 3 16 0.9239 0 0.3827 1 0 0 1 0 1
  [3,16,0.9239,0,0.3827,1,0,0,1,0,1],
// 3 16 0.7071 0 0.7071 0.9239 0 0.3827 1 0 1
  [3,16,0.7071,0,0.7071,0.9239,0,0.3827,1,0,1],
// 3 16 0.3827 0 0.9239 0.7071 0 0.7071 1 0 1
  [3,16,0.3827,0,0.9239,0.7071,0,0.7071,1,0,1],
// 3 16 0 0 1 0.3827 0 0.9239 1 0 1
  [3,16,0,0,1,0.3827,0,0.9239,1,0,1],
// 3 16 -0.3827 0 0.9239 0 0 1 -1 0 1
  [3,16,-0.3827,0,0.9239,0,0,1,-1,0,1],
// 3 16 -0.7071 0 0.7071 -0.3827 0 0.9239 -1 0 1
  [3,16,-0.7071,0,0.7071,-0.3827,0,0.9239,-1,0,1],
// 3 16 -0.9239 0 0.3827 -0.7071 0 0.7071 -1 0 1
  [3,16,-0.9239,0,0.3827,-0.7071,0,0.7071,-1,0,1],
// 3 16 -1 0 0 -0.9239 0 0.3827 -1 0 1
  [3,16,-1,0,0,-0.9239,0,0.3827,-1,0,1],
];
module ldraw_lib__2_4ndis(step=0, col=false, unit=2/5, alt=false, line=0.2, solid=!$preview)
    makepoly(ldraw_lib__2_4ndis(), step=step, col=col, unit=unit, alt=alt, line=line, solid=solid);
ldraw_lib__2_4ndis(line=0.2);
// file: ../p/2-4chrd.scad
use <../lib.scad>
$fa=1; $fs=0.2;
function ldraw_lib__2_4chrd(realsolid=false) = [
// 0 Chord 0.5
// 0 Name: 2-4chrd.dat
// 0 Author: Philippe Hurbain [Philo]
// 0 !LDRAW_ORG Primitive UPDATE 2014-01
// 0 !LICENSE Licensed under CC BY 2.0 and CC BY 4.0 : see CAreadme.txt
// 
// 0 BFC CERTIFY CCW
  [0,"BFC","CERTIFY"],
  [0,"BFC","CCW"],
// 
// 0 !HISTORY 2014-06-21 [PTadmin] Official Update 2014-01
// 
// 
// 4 16 0.9239 0 0.3827 -0.9239 0 0.3827 -1 0 0 1 0 0
  [4,16,0.9239,0,0.3827,-0.9239,0,0.3827,-1,0,0,1,0,0],
// 4 16 0.7071 0 0.7071 -0.7071 0 0.7071 -0.9239 0 0.3827 0.9239 0 0.3827
  [4,16,0.7071,0,0.7071,-0.7071,0,0.7071,-0.9239,0,0.3827,0.9239,0,0.3827],
// 4 16 0.3827 0 0.9239 -0.3827 0 0.9239 -0.7071 0 0.7071 0.7071 0 0.7071
  [4,16,0.3827,0,0.9239,-0.3827,0,0.9239,-0.7071,0,0.7071,0.7071,0,0.7071],
// 3 16 0 0 1 -0.3827 0 0.9239 0.3827 0 0.9239
  [3,16,0,0,1,-0.3827,0,0.9239,0.3827,0,0.9239],
];
module ldraw_lib__2_4chrd(step=0, col=false, unit=2/5, alt=false, line=0.2, solid=!$preview)
    makepoly(ldraw_lib__2_4chrd(solid), step=step, col=col, unit=unit, alt=alt, line=line, solid=solid);
ldraw_lib__2_4chrd(line=0.2);
// main file
use <../lib.scad>
use <../p/2-4chrd.scad>
use <../p/2-4ndis.scad>
use <s/87079s01.scad>
function ldraw_lib__87079p0h() = [
// 0 Tile  2 x  4 with Metallic Silver Tapered Stripe Pattern
// 0 Name: 87079p0h.dat
// 0 Author: Vincent Messenet [Cheenzo]
// 0 !LDRAW_ORG Part UPDATE 2024-07
// 0 !LICENSE Licensed under CC BY 4.0 : see CAreadme.txt
// 
// 0 BFC CERTIFY CCW
  [0,"BFC","CERTIFY"],
  [0,"BFC","CCW"],
// 
// 0 !KEYWORDS Bricklink 87079pb1309, Rebrickable 87079pr0313, Set 10321
// 
// 0 !HISTORY 2024-08-26 [OrionP] Official Update 2024-07
// 
// 1 16 0 0 0 1 0 0 0 1 0 0 0 1 s\87079s01.dat
  [1,16,0,0,0,1,0,0,0,1,0,0,0,1, ldraw_lib__s__87079s01()],
// 
// 4 80 -39.5 0 2 -39.5 0 -2 7.5 0 -2 7.5 0 2
  [4,80,-39.5,0,2,-39.5,0,-2,7.5,0,-2,7.5,0,2],
// 1 80 7.5 0 0 0 0 13.5 0 1 0 2 0 0 2-4chrd.dat
  [1,80,7.5,0,0,0,0,13.5,0,1,0,2,0,0, ldraw_lib__2_4chrd()],
// 1 16 7.5 0 0 0 0 13.5 0 1 0 2 0 0 2-4ndis.dat
  [1,16,7.5,0,0,0,0,13.5,0,1,0,2,0,0, ldraw_lib__2_4ndis()],
// 4 16 7.5 0 -2 -39.5 0 -2 -40 0 -20 40 0 -20
  [4,16,7.5,0,-2,-39.5,0,-2,-40,0,-20,40,0,-20],
// 3 16 7.5 0 2 21 0 2 40 0 20
  [3,16,7.5,0,2,21,0,2,40,0,20],
// 4 16 40 0 -20 40 0 20 21 0 2 21 0 0
  [4,16,40,0,-20,40,0,20,21,0,2,21,0,0],
// 3 16 21 0 0 21 0 -2 40 0 -20
  [3,16,21,0,0,21,0,-2,40,0,-20],
// 3 16 40 0 -20 21 0 -2 7.5 0 -2
  [3,16,40,0,-20,21,0,-2,7.5,0,-2],
// 4 16 7.5 0 2 40 0 20 -40 0 20 -39.5 0 2
  [4,16,7.5,0,2,40,0,20,-40,0,20,-39.5,0,2],
// 4 16 -39.5 0 -2 -39.5 0 2 -40 0 20 -40 0 -20
  [4,16,-39.5,0,-2,-39.5,0,2,-40,0,20,-40,0,-20],
];
module ldraw_lib__87079p0h(step=0, col=false, unit=2/5, alt=false, line=0.2, solid=!$preview)
    makepoly(ldraw_lib__87079p0h(), step=step, col=col, unit=unit, alt=alt, line=line, solid=solid);
ldraw_lib__87079p0h(line=0.2);
